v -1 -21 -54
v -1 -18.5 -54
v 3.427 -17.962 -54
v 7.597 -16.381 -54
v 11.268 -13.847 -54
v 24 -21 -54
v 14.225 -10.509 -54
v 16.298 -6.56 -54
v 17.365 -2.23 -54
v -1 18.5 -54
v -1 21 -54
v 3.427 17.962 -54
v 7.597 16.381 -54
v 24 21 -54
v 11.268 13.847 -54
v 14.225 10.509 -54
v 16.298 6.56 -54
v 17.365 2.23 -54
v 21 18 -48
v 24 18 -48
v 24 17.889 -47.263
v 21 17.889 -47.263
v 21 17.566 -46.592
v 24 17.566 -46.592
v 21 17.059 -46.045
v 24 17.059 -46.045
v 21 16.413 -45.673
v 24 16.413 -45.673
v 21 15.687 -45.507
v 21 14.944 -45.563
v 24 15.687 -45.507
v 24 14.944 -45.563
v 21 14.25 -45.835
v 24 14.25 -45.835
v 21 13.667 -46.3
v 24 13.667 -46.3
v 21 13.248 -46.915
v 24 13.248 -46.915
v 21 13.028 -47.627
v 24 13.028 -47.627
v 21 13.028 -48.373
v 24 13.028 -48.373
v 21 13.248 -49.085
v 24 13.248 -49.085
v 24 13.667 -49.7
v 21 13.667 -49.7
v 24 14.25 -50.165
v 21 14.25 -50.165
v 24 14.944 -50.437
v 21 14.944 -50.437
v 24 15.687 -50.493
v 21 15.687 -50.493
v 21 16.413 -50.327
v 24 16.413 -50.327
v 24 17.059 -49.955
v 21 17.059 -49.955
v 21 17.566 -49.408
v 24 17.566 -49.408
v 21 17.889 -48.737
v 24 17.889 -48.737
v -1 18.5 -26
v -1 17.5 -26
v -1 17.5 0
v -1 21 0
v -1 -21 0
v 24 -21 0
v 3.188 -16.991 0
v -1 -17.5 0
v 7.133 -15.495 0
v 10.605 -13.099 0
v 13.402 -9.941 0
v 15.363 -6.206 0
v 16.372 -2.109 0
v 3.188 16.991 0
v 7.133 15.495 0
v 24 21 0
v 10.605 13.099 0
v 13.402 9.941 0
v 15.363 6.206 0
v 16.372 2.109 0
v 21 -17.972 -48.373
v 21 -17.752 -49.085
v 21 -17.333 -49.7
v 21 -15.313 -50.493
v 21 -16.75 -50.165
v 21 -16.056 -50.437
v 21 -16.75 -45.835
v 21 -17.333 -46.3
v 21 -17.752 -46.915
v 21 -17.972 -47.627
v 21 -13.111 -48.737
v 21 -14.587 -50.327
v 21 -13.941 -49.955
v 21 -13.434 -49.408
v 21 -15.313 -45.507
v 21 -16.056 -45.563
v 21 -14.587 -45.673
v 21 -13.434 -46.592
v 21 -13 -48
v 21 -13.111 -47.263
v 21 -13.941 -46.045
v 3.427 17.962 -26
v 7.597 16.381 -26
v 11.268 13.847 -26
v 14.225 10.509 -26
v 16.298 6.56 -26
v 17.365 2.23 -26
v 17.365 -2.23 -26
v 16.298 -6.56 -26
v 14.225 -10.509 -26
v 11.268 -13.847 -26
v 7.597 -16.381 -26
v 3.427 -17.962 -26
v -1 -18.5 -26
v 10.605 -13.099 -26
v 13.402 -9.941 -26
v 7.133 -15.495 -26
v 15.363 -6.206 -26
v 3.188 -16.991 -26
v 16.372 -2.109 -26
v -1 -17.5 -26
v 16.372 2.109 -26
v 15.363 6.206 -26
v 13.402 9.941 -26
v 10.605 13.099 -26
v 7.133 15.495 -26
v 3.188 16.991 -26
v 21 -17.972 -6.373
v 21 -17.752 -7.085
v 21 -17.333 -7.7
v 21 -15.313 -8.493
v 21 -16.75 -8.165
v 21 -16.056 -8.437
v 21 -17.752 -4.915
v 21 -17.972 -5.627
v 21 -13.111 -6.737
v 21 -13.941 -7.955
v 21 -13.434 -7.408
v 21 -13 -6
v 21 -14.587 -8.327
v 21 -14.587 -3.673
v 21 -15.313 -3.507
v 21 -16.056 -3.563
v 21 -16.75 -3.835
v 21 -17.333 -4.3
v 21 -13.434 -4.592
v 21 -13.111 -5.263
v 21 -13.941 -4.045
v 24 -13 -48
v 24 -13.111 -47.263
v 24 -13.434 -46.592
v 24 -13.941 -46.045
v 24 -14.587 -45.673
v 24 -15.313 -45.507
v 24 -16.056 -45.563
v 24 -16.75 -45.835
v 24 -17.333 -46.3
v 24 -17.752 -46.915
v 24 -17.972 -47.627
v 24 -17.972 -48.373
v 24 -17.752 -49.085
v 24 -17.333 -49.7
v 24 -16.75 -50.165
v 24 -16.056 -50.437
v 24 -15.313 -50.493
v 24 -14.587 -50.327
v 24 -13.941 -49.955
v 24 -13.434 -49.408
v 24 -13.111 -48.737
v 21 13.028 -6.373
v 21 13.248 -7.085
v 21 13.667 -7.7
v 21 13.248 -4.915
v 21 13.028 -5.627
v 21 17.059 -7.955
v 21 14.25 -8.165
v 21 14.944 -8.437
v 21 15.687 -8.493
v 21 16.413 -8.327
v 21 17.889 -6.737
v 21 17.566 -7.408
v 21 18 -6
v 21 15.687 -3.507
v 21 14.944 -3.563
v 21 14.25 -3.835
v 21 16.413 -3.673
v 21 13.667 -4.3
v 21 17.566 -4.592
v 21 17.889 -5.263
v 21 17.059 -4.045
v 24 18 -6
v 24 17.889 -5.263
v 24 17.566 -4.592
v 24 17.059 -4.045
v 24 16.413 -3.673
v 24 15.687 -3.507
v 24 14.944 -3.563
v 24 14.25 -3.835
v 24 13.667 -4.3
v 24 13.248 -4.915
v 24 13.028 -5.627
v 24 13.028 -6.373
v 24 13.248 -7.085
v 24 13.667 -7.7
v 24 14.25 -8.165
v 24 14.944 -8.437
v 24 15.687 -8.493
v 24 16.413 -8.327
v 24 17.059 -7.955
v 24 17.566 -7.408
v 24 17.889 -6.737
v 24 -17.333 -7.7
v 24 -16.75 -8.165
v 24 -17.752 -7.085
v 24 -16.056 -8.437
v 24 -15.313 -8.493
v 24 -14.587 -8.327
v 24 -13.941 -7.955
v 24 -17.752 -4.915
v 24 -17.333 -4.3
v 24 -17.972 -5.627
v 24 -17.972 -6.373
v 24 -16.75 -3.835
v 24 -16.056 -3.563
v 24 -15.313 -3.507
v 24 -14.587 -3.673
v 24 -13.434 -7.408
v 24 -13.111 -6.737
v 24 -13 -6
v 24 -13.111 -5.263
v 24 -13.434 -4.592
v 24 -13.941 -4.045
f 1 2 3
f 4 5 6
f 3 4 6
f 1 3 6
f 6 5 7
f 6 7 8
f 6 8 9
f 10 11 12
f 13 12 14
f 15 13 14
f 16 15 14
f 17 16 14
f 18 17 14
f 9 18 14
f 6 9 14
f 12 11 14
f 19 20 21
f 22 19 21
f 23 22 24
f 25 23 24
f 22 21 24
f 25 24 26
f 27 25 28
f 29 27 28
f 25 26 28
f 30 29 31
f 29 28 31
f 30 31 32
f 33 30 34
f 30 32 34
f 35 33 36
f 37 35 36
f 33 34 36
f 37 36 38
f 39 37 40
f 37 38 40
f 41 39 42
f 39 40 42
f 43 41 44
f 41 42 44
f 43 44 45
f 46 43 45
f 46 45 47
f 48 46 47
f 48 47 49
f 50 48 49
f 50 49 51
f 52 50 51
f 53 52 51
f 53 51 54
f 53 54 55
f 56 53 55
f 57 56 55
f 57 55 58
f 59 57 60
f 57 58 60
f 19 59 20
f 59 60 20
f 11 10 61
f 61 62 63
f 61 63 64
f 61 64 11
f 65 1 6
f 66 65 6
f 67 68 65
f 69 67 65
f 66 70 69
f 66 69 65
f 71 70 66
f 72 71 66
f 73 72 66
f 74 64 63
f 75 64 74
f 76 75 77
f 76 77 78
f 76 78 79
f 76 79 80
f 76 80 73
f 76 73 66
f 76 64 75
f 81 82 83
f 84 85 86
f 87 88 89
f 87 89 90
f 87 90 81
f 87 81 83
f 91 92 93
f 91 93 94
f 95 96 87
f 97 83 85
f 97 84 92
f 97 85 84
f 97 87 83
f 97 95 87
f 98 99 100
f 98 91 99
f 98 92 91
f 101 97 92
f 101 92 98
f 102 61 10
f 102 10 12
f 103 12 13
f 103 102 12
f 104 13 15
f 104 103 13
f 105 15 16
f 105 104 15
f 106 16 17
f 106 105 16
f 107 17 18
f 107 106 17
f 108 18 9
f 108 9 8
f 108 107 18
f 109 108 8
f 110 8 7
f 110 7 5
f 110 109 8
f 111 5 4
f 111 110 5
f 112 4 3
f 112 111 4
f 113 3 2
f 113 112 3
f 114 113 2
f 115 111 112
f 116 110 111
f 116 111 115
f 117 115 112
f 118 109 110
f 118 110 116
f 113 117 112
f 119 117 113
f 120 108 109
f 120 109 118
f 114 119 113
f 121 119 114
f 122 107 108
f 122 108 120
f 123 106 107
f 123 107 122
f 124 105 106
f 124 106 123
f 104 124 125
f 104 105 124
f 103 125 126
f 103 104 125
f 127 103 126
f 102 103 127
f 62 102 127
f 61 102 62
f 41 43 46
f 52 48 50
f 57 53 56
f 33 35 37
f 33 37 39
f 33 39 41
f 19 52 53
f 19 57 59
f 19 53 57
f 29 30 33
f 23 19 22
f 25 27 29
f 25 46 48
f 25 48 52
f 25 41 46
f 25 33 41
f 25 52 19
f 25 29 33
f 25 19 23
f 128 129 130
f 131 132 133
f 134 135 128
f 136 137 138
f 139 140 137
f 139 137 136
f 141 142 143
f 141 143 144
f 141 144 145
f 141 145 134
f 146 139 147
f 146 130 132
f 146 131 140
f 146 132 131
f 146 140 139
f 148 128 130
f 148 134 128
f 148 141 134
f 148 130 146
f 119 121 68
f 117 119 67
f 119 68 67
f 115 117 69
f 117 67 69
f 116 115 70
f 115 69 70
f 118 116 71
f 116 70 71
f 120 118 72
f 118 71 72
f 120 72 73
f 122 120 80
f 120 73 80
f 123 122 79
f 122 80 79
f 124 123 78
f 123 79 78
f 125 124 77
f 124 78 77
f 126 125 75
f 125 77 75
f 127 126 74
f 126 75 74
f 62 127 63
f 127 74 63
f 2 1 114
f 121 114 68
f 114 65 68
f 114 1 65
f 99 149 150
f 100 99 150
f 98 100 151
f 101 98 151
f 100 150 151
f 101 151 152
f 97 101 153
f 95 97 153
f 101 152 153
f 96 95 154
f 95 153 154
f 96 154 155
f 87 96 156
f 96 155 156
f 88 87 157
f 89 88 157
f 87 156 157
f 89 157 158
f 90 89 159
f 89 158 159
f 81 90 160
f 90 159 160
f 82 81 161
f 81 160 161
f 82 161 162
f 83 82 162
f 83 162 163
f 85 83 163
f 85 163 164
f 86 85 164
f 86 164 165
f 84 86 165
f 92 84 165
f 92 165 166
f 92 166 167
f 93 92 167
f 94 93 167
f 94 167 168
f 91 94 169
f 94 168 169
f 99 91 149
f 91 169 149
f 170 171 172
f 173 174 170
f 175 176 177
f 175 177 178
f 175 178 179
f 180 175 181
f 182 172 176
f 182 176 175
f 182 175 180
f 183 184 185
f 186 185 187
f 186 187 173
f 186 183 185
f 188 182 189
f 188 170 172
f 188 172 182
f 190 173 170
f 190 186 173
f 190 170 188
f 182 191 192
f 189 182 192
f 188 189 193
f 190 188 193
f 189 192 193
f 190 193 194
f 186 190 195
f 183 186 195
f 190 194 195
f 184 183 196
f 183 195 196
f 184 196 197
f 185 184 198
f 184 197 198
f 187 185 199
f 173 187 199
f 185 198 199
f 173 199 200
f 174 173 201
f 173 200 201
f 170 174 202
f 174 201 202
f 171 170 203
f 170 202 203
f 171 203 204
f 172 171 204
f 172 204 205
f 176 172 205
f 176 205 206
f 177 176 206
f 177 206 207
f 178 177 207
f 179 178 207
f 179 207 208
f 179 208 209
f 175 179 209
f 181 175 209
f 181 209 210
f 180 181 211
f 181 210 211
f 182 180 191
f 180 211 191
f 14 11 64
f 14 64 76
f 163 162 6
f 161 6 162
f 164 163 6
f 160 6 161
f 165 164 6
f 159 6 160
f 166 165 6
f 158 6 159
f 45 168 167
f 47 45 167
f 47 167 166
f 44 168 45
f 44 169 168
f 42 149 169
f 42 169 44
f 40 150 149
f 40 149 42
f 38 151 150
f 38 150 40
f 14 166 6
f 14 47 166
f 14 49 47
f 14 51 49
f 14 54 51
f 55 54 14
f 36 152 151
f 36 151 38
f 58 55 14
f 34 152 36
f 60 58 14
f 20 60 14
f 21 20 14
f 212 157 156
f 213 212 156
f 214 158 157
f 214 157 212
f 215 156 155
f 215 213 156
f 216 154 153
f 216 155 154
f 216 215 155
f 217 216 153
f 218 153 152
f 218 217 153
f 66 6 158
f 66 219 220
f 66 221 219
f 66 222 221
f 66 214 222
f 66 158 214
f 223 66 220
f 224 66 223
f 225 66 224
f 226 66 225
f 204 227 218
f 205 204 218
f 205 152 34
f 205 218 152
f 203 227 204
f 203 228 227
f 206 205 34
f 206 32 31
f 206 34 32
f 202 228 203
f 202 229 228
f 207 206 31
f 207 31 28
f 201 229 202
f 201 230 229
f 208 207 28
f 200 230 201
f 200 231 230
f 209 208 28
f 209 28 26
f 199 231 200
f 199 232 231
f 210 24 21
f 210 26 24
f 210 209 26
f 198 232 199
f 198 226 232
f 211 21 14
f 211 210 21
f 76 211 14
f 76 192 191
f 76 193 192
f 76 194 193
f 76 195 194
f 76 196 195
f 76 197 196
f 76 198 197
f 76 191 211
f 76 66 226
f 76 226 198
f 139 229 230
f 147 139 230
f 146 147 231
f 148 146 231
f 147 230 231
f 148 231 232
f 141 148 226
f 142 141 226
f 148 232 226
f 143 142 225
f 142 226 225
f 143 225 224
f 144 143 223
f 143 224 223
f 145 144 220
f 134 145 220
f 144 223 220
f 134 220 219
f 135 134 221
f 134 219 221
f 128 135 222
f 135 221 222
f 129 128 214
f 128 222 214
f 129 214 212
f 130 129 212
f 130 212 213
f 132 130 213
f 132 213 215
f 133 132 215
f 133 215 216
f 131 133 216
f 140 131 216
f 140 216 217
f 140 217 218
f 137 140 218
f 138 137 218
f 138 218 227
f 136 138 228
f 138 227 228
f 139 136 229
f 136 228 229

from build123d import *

# Parameters (mm, degrees)
SKETCH1_W           = 25
SKETCH1_H           = 42
BOSS_EXTRUDE1_DEPTH = 54
CUT_EXTRUDE1_START  = -28
SKETCH2_R           = 18.5
CUT_EXTRUDE1_DEPTH  = 28
CUT_EXTRUDE2_REACH  = 64.714
SKETCH3_R           = 17.5
SKETCH4_R           = 2.5
CUT_EXTRUDE3_DEPTH  = 3


with BuildPart() as part:
    # Sketch1 → Boss-Extrude1 (new body)
    with BuildSketch(Plane.XY):
        with Locations((11.5, 0)):
            Rectangle(SKETCH1_W, SKETCH1_H)
    extrude(amount=-BOSS_EXTRUDE1_DEPTH)

    # Sketch2 → Cut-Extrude1 (cut)
    with BuildSketch(Plane(origin=(0, 0, -54), x_dir=(-1, 0, 0), z_dir=(0, 0, -1)).offset(CUT_EXTRUDE1_START)):
        with Locations((1, 0)):
            Circle(SKETCH2_R)
    extrude(amount=CUT_EXTRUDE1_DEPTH, mode=Mode.SUBTRACT)

    # Sketch3 → Cut-Extrude2 (cut, up to next)
    with BuildSketch(Plane.XY, mode=Mode.PRIVATE) as cut_extrude2_sk1:
        with Locations((-1, 0)):
            Circle(SKETCH3_R)
    cut_extrude2_tool1 = extrude(cut_extrude2_sk1.sketch, amount=-CUT_EXTRUDE2_REACH, mode=Mode.PRIVATE) & part.part
    add(cut_extrude2_tool1.solids().sort_by_distance((-1, 0, 0))[0], mode=Mode.SUBTRACT)

    # Sketch4 → Cut-Extrude3 (cut)
    with BuildSketch(Plane(origin=(24, 0, 0), x_dir=(0, 0, -1), z_dir=(1, 0, 0))):
        with Locations(Location((6, 15.5, 0), (0, 0, 90))):
            Circle(SKETCH4_R)
        with Locations(Location((48, 15.5, 0), (0, 0, 90))):
            Circle(SKETCH4_R)
        with Locations(Location((6, -15.5, 0), (0, 0, 90))):
            Circle(SKETCH4_R)
        with Locations(Location((48, -15.5, 0), (0, 0, 90))):
            Circle(SKETCH4_R)
    extrude(amount=-CUT_EXTRUDE3_DEPTH, mode=Mode.SUBTRACT)


solid = part.part
